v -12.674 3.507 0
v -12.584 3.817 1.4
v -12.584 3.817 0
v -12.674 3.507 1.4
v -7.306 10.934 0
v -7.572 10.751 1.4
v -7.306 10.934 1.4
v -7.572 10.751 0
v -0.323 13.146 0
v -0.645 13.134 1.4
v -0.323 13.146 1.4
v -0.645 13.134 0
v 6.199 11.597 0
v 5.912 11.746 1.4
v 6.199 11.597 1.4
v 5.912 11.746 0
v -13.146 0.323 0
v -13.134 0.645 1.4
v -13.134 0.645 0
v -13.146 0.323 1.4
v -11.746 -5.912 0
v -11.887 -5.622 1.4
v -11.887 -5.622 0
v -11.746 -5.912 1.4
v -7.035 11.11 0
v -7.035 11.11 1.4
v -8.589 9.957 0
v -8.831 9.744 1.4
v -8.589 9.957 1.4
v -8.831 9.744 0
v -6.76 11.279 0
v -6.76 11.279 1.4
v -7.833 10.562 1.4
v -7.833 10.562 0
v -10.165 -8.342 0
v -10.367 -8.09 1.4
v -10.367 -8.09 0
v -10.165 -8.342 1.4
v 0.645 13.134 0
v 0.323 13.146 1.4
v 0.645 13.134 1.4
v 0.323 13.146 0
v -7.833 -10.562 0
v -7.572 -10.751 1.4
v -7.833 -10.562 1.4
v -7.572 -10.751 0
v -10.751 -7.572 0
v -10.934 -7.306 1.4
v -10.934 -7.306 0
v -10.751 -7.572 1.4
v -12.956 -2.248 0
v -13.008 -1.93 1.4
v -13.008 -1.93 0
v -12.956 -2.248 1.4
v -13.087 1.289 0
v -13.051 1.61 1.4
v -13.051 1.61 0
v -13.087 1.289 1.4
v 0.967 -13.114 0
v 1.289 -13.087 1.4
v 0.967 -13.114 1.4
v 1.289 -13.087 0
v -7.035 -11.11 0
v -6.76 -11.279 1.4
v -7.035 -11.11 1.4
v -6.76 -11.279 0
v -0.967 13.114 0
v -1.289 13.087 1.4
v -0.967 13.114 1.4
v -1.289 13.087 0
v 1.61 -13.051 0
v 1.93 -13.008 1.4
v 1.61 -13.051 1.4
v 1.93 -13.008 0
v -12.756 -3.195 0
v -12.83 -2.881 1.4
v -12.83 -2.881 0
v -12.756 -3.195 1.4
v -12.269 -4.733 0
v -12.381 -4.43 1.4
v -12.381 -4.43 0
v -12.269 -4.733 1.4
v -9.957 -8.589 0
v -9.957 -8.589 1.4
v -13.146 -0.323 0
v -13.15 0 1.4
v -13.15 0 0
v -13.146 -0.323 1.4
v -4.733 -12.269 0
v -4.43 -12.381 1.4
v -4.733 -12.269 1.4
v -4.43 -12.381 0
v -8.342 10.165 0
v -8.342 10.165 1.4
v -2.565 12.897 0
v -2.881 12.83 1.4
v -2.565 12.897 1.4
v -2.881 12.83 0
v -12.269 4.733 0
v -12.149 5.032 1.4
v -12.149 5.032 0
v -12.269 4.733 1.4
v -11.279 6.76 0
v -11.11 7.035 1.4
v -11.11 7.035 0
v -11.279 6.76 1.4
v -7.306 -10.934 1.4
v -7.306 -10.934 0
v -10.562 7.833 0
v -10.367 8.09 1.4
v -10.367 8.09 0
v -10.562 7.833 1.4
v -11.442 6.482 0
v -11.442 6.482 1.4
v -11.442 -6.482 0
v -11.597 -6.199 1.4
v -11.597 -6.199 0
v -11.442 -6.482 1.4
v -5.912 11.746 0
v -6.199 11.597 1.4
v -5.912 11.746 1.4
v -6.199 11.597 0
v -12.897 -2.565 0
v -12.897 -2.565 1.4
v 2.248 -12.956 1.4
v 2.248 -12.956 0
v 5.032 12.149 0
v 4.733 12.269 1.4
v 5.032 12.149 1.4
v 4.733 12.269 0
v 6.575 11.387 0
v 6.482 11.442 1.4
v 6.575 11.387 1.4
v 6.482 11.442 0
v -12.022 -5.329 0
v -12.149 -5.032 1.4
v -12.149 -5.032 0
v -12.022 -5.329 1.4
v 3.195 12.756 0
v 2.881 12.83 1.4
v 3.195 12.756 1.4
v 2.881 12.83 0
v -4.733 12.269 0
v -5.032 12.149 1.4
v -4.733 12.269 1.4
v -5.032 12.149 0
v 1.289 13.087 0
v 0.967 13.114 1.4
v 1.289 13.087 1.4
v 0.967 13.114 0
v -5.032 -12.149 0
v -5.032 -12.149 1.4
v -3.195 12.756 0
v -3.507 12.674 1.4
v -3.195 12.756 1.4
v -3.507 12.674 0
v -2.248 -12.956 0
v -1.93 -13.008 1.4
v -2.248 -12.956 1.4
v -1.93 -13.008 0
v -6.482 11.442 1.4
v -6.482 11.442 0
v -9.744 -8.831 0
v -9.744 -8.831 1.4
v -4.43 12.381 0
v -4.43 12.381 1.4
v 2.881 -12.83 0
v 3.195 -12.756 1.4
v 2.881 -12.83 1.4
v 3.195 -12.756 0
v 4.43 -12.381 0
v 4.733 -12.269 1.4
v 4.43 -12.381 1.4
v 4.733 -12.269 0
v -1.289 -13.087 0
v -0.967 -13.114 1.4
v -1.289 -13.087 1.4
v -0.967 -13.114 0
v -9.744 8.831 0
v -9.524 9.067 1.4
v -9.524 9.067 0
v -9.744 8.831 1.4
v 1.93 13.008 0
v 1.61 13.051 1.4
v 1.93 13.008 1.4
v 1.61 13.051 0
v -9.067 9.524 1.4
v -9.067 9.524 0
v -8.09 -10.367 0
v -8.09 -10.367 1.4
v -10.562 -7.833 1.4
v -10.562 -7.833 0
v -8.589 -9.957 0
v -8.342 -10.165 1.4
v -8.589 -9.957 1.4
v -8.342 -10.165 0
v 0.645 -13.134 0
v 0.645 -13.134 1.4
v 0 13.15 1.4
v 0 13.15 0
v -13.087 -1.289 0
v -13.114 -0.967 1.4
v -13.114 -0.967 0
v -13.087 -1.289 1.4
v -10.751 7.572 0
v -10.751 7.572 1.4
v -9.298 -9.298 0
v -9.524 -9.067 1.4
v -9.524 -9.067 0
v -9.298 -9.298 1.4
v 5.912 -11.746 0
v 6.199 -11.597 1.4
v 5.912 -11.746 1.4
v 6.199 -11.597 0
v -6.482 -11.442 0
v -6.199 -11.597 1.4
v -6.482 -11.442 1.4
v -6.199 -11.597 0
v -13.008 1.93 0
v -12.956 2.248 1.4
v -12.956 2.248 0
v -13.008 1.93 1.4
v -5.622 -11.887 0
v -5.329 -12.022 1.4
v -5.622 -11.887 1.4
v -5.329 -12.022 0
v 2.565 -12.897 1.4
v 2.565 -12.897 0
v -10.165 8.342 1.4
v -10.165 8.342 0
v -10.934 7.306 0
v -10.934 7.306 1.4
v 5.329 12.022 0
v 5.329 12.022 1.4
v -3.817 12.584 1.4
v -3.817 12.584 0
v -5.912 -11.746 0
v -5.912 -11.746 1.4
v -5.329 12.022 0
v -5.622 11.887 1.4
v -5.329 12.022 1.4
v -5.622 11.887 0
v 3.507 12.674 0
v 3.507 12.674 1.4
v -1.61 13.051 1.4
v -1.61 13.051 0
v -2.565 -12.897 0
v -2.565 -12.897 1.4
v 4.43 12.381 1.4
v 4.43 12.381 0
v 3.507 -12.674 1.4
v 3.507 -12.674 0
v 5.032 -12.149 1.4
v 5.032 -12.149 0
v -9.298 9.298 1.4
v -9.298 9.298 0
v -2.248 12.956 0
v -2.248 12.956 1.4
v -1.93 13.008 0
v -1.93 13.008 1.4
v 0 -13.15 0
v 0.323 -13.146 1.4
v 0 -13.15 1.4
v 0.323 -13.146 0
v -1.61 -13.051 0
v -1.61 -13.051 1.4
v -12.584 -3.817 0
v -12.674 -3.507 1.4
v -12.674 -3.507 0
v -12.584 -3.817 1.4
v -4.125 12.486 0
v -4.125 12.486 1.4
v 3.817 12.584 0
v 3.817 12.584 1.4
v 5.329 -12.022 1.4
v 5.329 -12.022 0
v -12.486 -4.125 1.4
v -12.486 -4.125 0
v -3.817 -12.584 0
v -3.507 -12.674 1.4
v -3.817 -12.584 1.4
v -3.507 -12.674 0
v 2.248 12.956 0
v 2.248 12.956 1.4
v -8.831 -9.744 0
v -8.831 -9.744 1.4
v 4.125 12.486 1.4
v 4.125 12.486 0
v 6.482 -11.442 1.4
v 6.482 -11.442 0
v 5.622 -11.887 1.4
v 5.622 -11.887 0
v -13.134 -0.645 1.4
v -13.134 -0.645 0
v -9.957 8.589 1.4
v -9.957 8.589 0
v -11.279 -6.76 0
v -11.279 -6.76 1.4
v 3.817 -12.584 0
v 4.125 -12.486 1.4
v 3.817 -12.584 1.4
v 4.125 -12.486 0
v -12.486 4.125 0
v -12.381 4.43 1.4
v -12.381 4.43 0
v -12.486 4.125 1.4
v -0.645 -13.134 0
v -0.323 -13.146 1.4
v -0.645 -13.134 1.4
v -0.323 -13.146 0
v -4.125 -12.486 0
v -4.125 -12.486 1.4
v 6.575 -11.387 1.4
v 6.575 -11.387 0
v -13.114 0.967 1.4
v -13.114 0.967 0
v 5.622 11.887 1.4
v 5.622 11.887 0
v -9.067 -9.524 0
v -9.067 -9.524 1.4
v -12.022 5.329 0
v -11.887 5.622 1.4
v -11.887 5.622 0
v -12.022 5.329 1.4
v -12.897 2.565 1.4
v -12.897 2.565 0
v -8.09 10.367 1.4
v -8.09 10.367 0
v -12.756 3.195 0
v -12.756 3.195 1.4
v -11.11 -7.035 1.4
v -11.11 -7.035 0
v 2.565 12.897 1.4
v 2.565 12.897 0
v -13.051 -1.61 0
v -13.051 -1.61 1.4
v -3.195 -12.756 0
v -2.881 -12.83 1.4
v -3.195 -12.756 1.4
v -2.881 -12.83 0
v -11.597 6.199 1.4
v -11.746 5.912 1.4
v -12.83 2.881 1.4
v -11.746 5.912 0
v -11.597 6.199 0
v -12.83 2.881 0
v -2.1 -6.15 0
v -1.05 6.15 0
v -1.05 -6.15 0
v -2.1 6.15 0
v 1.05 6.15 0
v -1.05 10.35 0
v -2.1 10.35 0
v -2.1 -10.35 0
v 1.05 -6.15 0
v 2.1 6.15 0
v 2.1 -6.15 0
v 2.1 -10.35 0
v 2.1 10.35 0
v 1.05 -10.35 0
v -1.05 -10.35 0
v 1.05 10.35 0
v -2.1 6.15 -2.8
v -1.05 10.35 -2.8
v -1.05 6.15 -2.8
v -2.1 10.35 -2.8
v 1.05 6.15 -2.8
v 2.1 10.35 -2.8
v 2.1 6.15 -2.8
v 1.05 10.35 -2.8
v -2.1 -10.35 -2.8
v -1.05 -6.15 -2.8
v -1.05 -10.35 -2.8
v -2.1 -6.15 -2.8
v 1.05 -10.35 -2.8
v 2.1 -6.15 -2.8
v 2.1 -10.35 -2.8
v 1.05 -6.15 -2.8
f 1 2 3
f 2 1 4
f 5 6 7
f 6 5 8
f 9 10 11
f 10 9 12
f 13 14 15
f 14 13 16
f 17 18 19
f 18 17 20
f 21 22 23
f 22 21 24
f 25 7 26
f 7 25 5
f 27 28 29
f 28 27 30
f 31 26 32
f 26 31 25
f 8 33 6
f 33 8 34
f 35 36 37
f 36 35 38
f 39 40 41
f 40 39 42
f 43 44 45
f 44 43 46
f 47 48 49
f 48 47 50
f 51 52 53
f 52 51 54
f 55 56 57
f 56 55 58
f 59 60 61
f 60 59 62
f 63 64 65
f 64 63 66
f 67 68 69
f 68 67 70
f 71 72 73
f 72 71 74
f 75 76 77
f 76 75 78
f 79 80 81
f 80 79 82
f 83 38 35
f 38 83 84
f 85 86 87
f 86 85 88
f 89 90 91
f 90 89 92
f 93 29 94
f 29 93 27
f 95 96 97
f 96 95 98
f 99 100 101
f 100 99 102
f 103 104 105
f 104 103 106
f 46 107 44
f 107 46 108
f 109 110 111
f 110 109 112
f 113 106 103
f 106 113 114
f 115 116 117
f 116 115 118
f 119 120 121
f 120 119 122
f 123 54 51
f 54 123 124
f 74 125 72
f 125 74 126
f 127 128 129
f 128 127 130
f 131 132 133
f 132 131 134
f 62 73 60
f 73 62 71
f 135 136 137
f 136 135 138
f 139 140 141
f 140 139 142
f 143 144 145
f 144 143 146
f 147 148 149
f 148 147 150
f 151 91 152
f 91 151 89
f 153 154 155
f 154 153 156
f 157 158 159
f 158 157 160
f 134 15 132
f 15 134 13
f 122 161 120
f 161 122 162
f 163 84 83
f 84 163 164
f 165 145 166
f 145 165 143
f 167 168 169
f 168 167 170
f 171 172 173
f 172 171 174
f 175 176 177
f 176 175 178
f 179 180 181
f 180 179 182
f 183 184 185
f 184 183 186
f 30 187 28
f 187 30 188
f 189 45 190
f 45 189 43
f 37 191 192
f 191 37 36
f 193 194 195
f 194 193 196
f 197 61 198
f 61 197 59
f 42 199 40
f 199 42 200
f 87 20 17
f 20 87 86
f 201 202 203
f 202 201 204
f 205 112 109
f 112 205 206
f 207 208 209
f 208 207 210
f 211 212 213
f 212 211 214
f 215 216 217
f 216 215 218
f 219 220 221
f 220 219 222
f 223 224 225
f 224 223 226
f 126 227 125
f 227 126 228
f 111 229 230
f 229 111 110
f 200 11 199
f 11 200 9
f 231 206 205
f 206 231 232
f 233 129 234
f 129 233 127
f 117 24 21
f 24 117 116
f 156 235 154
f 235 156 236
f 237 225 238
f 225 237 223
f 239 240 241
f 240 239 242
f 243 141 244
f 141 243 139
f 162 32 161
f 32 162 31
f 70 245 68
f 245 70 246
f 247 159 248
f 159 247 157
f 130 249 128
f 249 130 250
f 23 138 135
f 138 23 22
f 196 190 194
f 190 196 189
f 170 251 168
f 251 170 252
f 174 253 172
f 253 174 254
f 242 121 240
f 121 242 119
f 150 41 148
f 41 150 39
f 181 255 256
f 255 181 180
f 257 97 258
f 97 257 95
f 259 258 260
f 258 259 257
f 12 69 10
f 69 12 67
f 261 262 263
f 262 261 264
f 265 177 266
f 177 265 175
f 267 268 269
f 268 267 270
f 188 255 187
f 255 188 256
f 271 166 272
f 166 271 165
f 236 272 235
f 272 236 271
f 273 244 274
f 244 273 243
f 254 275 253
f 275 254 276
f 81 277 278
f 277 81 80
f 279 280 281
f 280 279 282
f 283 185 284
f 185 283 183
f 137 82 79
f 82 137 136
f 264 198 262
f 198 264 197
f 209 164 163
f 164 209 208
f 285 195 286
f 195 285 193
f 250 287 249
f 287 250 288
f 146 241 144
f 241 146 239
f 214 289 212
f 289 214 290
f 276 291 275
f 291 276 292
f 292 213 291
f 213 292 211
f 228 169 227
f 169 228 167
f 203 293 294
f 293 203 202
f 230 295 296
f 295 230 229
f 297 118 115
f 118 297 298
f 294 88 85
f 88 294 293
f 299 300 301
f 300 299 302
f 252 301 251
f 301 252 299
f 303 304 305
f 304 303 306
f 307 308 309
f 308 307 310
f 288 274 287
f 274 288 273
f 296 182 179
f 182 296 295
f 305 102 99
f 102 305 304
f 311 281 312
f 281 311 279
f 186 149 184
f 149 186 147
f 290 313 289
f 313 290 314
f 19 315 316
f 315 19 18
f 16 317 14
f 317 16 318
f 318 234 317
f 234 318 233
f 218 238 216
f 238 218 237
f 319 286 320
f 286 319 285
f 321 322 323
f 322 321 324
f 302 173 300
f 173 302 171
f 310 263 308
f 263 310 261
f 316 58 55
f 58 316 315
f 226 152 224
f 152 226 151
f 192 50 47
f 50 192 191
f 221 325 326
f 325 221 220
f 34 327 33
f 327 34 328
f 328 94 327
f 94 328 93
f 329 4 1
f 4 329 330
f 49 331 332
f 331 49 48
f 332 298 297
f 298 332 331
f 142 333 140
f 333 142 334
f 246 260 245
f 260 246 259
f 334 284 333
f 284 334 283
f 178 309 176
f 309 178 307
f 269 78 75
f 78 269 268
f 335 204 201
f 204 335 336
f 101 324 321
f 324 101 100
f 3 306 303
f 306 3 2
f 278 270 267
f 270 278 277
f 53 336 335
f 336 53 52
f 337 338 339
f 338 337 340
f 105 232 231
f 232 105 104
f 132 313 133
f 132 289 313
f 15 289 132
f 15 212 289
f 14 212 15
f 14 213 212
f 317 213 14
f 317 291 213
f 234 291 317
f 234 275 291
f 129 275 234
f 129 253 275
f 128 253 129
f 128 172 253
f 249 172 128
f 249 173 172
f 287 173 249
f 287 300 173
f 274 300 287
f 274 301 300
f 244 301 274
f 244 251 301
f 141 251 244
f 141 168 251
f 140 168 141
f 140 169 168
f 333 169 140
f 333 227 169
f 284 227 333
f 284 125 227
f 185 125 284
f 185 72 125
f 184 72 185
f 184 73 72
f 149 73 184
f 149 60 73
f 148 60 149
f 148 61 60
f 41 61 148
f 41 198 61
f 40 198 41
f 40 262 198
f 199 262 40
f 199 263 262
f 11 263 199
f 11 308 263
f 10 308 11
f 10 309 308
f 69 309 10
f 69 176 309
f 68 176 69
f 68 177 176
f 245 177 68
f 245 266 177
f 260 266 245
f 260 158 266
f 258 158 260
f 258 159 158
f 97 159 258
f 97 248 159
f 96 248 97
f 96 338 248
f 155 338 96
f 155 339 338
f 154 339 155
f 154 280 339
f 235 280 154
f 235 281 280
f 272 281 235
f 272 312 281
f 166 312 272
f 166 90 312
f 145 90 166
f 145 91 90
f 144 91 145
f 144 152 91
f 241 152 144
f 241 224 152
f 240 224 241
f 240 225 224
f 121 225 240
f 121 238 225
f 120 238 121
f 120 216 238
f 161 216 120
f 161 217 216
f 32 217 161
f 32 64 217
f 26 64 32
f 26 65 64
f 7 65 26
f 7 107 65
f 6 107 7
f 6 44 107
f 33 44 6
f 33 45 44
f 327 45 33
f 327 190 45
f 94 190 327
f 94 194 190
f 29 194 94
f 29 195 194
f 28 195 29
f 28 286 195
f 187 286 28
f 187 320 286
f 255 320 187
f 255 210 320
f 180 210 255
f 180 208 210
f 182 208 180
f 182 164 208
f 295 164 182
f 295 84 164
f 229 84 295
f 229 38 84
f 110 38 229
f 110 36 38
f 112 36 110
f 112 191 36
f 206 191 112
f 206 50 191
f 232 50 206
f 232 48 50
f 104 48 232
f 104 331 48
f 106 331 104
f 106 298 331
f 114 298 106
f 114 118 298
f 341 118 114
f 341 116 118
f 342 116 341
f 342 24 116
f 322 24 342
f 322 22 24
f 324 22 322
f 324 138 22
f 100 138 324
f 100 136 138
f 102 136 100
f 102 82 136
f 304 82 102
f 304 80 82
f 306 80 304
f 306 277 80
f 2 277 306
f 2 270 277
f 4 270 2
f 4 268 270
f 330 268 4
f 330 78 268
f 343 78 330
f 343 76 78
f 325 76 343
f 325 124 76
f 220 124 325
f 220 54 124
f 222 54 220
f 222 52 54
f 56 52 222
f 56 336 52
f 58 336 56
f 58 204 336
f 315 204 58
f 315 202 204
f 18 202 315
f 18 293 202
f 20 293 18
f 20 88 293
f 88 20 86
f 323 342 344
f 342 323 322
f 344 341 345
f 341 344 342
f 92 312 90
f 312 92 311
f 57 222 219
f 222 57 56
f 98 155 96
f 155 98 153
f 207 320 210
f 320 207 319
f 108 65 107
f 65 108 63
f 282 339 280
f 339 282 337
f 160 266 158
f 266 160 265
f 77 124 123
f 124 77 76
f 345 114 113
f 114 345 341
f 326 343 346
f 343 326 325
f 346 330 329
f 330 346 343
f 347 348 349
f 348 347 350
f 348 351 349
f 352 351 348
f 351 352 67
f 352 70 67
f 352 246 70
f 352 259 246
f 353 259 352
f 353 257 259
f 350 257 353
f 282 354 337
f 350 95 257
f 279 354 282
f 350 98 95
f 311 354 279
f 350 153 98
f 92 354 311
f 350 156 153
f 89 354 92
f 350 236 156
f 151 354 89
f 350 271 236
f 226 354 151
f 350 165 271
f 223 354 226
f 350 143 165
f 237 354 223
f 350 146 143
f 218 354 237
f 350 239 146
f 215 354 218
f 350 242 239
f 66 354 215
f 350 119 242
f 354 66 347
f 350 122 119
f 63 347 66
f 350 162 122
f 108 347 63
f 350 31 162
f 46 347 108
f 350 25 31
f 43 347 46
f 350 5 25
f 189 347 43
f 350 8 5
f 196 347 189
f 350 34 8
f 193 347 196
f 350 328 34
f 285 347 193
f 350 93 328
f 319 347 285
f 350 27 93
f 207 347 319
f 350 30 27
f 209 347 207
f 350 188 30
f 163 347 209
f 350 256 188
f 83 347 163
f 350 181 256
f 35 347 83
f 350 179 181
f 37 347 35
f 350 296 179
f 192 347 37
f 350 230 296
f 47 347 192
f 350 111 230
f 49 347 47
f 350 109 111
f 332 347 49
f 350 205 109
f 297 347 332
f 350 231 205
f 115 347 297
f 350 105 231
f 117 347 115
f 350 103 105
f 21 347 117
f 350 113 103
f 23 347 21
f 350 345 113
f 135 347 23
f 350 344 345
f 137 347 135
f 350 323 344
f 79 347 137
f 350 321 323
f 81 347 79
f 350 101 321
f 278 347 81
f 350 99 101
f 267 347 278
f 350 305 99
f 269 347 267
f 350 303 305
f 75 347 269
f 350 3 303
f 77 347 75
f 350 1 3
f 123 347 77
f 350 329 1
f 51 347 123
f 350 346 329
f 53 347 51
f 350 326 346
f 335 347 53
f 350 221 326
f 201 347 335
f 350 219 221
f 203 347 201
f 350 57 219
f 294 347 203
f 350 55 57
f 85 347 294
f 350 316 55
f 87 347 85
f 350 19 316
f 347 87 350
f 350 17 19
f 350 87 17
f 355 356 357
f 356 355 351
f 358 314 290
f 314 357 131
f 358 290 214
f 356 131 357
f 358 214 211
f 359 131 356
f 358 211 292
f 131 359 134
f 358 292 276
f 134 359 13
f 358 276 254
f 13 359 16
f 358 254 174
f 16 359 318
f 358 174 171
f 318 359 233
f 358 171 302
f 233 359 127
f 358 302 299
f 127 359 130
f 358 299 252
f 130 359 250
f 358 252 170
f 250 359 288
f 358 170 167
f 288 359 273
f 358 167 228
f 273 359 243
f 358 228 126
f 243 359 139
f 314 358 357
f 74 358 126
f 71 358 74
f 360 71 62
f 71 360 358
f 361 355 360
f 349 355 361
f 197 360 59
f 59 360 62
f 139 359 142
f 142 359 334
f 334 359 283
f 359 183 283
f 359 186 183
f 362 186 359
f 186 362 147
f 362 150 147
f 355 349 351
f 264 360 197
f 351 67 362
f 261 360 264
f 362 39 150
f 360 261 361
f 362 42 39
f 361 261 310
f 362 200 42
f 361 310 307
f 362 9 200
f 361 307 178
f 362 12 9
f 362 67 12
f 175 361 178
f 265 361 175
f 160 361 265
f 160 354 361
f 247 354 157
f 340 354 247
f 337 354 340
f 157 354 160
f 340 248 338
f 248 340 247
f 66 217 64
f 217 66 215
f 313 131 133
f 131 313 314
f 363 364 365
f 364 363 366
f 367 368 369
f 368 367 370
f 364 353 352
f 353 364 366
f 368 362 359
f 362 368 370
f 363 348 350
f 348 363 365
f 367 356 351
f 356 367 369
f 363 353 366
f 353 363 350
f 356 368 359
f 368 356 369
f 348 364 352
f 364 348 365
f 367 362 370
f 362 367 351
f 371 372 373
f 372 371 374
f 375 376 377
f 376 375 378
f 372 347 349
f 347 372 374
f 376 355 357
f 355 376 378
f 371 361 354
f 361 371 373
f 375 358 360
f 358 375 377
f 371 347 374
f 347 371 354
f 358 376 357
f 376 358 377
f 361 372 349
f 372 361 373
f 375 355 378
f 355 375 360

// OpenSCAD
// file: components/Fittings.scad
// debug object
union() {
    $fn=150;
    tlrnc = 0.35;
    w=1.4;
    topFitting(15, 30, w, tlrnc=tlrnc);

    translate ([0,0, 15]) fitting(15, 30, w, tlrnc=tlrnc);
}

module topFitting(overlap, internalDiameter, wallThicknes, tlrnc=0.1) {
    zd = 0.001; //size difference for improve quick rendering

    h = (wallThicknes - tlrnc)/2;
    outerDiameter = internalDiameter + 2 * wallThicknes;
    interFitDiam = internalDiameter + wallThicknes + tlrnc*2;
    echo(str(">>> topFitting::Outer Diameter=", outerDiameter));
    echo(str(">>> topFitting::Inner diameter=", interFitDiam));
    difference() {
        cylinder(h=overlap, d=outerDiameter);
            union() {
                translate([0,0,h]) cylinder(h=overlap, d=interFitDiam);
                cylinder(h=h+zd, d1=internalDiameter, d2=interFitDiam);
            }
            translate([0,0,-zd]) cylinder(h=overlap + 2*zd, d=internalDiameter);
    }
}

module fitting(overlap, internalDiameter, wallThicknes, tlrnc=0.1) {
    zd = 0.001; //size difference for improve quick rendering
    
    outerDiameter = internalDiameter + 2 * wallThicknes;
    interFitDiam = internalDiameter + wallThicknes - tlrnc*2;
    h = (wallThicknes - tlrnc)/2;
    echo(str(">>> fitting::Outer Diameter=", outerDiameter));
    echo(str(">>> fitting::Inner diameter=", interFitDiam));

    difference() {
        difference() {
            union() {
                cylinder(h=overlap, d=interFitDiam);
                translate([0,0,overlap-h])cylinder(h=h, d1=interFitDiam, d2=outerDiameter);
            }
        }
        translate([0,0,-zd]) cylinder(h=overlap + 2*zd, d=internalDiameter);
    }
}

module tube(length, internalDiameter, wallThicknes) {
    zd = 0.001; //size difference for improve quick rendering
    difference() {
        cylinder(h=length, d=internalDiameter + 2*wallThicknes);
        translate([0,0,-zd]) cylinder(h=length + 2*zd, d=internalDiameter);
    }
}
// file: CamAltimeterFrame.scad
use <Camera.scad>
include <Settings.scad>

//internalDiameter=internalDiameter - 2*tlrnc;

length=100;
camL=14;
camW=18;

CamAltimeterMount(length, internalDiameter - 2*tlrnc, wallThicknes, tlrnc);

module CamAltimeterMount(length, internalDiameter, wallThicknes, tlrnc) {
    translate([-internalDiameter/2, -wallThicknes/2, 0 ]) {
        difference() {
            cube([internalDiameter, wallThicknes, length ]);
            translate([internalDiameter/2 - camL/2 ,-tlrnc,length -camW ]) {
                cube([camL, wallThicknes + 2 * tlrnc, camW ]);
            }
        }
        translate([internalDiameter/2 + camL/2,-3*wallThicknes/2,length -camW + camW/2 ]) holder();
        translate([internalDiameter/2 - camL/2 - 3,-3*wallThicknes/2,length -camW + camW/2 ]) holder();
    }
}

module holder() {
    rotate([0,90,0]) difference() {
        cylinder(r=3, h=3);
        cylinder(r=1, h=3 + tlrnc);
    }
}
// file: MainTube.scad
use <components/Fittings.scad>
/// coments
//params
include <Settings.scad>


length=200;

MainTube(length, internalDiameter, wallThicknes, overlap, tlrnc);

module MainTube(length, internalDiameter, wallThicknes, overlap, tlrnc) {
    zd = 0.001; //size difference for improve quick rendering

    translate([0, 0, length - overlap]) topFitting(overlap, internalDiameter, wallThicknes);
    translate([0,0, overlap]) tube(length - 2* overlap, internalDiameter, wallThicknes);
    fitting(overlap, internalDiameter, wallThicknes);
}
// file: NoseCone.scad
use <components/Fittings.scad>

/// coments
//params
include <Settings.scad>

curveSteps=$fn >100 ? 100 : $fn;

length=72;
holderBarLength = 3*internalDiameter/5;
holderBarDiameter=5;

type=""; //"Power";//"TO";//"Conic";

/**
Parabola Type	K′ Value
--------------------------
Cone	0
Half	1/2
Three Quarter	3/4
Full	1
**/
K=1;

/**
Power Type	N Value
-----------------
Cylinder	0
Half (Parabola)	1/2
Three Quarter	3/4
Cone	1
**/
N=3/4;

/**
Haack Series Type	C Value
-------------------------
LD-Haack (Von Kármán)	0
LV-Haack	1/3
Tangent	2/3
**/
C=1/3;

NoseCone(length, internalDiameter, true);

module NoseCone(l, internalDiameter, noBar = false) {
    translate([0,0,overlap])  {
        cone(l,(internalDiameter+2*wallThicknes)/2);
    }
    if (!noBar) {
        holderBar(overlap, internalDiameter, wallThicknes,holderBarLength, holderBarDiameter, tlrnc);
    }
    fitting(overlap, internalDiameter, wallThicknes, tlrnc);
}

module holderBar(overlap, internalDiameter, wallThicknes,holderBarLength, holderBarDiameter, tlrnc=0.1) {
    difference() {
        cylinder(h = overlap, d = internalDiameter);
        sphere(d = holderBarLength);
    }
    translate([0,holderBarLength/2,holderBarDiameter/2]) rotate([90, 0, 0]) cylinder(h=holderBarLength, d=holderBarDiameter);
}

module cone(l,r) {
    zd = 0.01;
    translate([0,0,l]) rotate([180,0,0]) {
        st=l/curveSteps;
        for(i=[0:st:l]) {
            dh = st + zd;
            translate([0, 0, i]) {
                if(type=="Conic") {
                    r1 = coneF(i, r, l);
                    r2 = coneF(i + st, r, l);
                    cylinder(h = dh, r1=r1, r2=r2 );
                } else if(type=="Ogive") {
                    r1 = tangOgiveF(i, r, l);
                    r2 = tangOgiveF(i + st, r, l);
                    cylinder(h = dh,r1=r1, r2=r2 );
                } else if(type=="Elliptical") {
                    r1 = elliptF(i, r, l);
                    r2 = elliptF(i + st, r, l);
                    cylinder(h = dh,r1=r1, r2=r2 );
                } else if(type=="Parabolic") {
                    r1 = parabF(i, r, l);
                    r2 = parabF(i + st, r, l);
                    cylinder(h = dh,r1=r1, r2=r2 );
                } else if(type=="Power") {
                    r1 = powerF(i, r, l);
                    r2 = powerF(i + st, r, l);
                    cylinder(h = dh,r1=r1, r2=r2 );
                } else {
                    r1 = haackF(i, r, l);
                    r2 = haackF(i + st, r, l);
                    cylinder(h = dh,r1=r1, r2=r2 );
                }
            }
        }
    }
}

function coneF(x,r,l) = x*r/l;
function tangOgiveF(x,r,l) = sqrt(pow(tangOgiveQ(r,l),2) - pow(l - x,2)) + r -tangOgiveQ(r,l);
function tangOgiveQ(r,l) = (r*r + l*l)/(2*r);
function elliptF(x, r, l) = r * sqrt(1-pow(l - x, 2)/pow(l, 2));
function parabF(x,r,l) = r * ((2*x/l -K*pow(x/l,2))/(2-K));
function powerF(x,r,l) = r * pow(x/l, N);
function hA(x,l) = acos(1-2*x/l);
function haackF(x,r,l) = r * sqrt(hA(x,l)*PI/180 - sin(2*hA(x,l))/2 + C * pow(sin(hA(x,l)),3))/sqrt(PI);
// file: Settings.scad
/// coments
//params

$fn=256;
tlrnc=0.35;
overlap=15;
internalDiameter=27;
perimeter = 0.5;
wallThicknes = 1.4;
// file: CamAltimeterMount.scad
use <NoseCone.scad>
use <Camera.scad>
use <MainTube.scad>
use <CamAltimeterFrame.scad>

/// coments
//params
include <Settings.scad>

length=100;
holderBarLength = 3*internalDiameter/5;
holderBarDiameter=5;


tubeWithWhole();

module tubeWithWhole() {
    difference() {
        outerTubeWithFitting(length, internalDiameter);
        translate([0,internalDiameter/2 - 3, length - 3 ]) rotate([-40, 0, 0]) #camera();
    }
    translate([internalDiameter/2-wallThicknes, 0, 0]) slot(length, wallThicknes, tlrnc);
    rotate([0,0,180]) translate([internalDiameter/2-wallThicknes, 0, 0]) slot(length, wallThicknes, tlrnc);
}

module outerTubeWithFitting(l, internalDiameter) {
    holderBar(overlap,internalDiameter,wallThicknes,holderBarLength,holderBarDiameter);
    MainTube(length + 2* overlap, internalDiameter, wallThicknes, overlap, tlrnc);
}

module slot(l, wallThicknes, tlrnc) {
    zd = 0.001;
    translate([-wallThicknes, -3/2 *wallThicknes, 0]) difference() {
        cube([2*wallThicknes, 3*wallThicknes, l]);
        translate([-zd, wallThicknes - tlrnc, -zd])
            cube([2*(wallThicknes + zd), wallThicknes + 2*tlrnc, l + 2*zd]);
    }
}
// file: Camera.scad
camera();

module camera() {
    objLength = 8;
    objD = 12;
    camW=14;
    camL=14;
    camH=8;
    
    union() {
        translate([0, -objLength - camH/2, 0]) rotate([90,0,0]) cube([camL, camW, camH], center=true);
        rotate([90,0,0]) translate([0, 0, -objLength]) cylinder(h=2*objLength, d=objD);
        translate([0,-4,0]) rotate([90,0,0]) viewField();
    }
}

module viewField() {
    hAng1 = 60;
    hAng2 = 60;
    vAng1 = 82 - 45;
    vAng2 = 45;
    coneHeight = 100;

    w1 = tan(hAng1) * coneHeight;
    w2 = -tan(hAng2) * coneHeight;
    h1 = tan(vAng1) * coneHeight;
    h2 = -tan(vAng2) * coneHeight;
    
    translate([0,0,-coneHeight]) polyhedron(
      points=[[w1,h1,0],[w1,h2,0],[w2,h2,0],[w2,h1,0],[0,0,coneHeight]],
      faces=[[0,1,4],[1,2,4],[2,3,4],[3,0,4],[1,0,3],[2,1,3]]
    );
}
// main file
use <Camera.scad>
use <CamAltimeterMount.scad>
include <Settings.scad>

camL=14;
camW=18;

GyroHolder(internalDiameter - 2*tlrnc, wallThicknes, tlrnc);

module GyroHolder(internalDiameter, wallThicknes, tlrnc) {
    zd = 0.001;
    difference() {
        cylinder(d=internalDiameter, h=wallThicknes);
        translate([internalDiameter/4, -internalDiameter/2, -zd]) cube([internalDiameter, internalDiameter, wallThicknes+2*zd]);
    }
    slotL = 3*wallThicknes;
    translate([0, internalDiameter/2 - slotL - 2*wallThicknes, -wallThicknes]) {
        rotate([0,90,90]) slot(slotL, wallThicknes, tlrnc);  
    }
    translate([0, -internalDiameter/2 + 2*wallThicknes, -wallThicknes]) {
        rotate([0,90,90]) slot(slotL, wallThicknes, tlrnc);  
    }

}
